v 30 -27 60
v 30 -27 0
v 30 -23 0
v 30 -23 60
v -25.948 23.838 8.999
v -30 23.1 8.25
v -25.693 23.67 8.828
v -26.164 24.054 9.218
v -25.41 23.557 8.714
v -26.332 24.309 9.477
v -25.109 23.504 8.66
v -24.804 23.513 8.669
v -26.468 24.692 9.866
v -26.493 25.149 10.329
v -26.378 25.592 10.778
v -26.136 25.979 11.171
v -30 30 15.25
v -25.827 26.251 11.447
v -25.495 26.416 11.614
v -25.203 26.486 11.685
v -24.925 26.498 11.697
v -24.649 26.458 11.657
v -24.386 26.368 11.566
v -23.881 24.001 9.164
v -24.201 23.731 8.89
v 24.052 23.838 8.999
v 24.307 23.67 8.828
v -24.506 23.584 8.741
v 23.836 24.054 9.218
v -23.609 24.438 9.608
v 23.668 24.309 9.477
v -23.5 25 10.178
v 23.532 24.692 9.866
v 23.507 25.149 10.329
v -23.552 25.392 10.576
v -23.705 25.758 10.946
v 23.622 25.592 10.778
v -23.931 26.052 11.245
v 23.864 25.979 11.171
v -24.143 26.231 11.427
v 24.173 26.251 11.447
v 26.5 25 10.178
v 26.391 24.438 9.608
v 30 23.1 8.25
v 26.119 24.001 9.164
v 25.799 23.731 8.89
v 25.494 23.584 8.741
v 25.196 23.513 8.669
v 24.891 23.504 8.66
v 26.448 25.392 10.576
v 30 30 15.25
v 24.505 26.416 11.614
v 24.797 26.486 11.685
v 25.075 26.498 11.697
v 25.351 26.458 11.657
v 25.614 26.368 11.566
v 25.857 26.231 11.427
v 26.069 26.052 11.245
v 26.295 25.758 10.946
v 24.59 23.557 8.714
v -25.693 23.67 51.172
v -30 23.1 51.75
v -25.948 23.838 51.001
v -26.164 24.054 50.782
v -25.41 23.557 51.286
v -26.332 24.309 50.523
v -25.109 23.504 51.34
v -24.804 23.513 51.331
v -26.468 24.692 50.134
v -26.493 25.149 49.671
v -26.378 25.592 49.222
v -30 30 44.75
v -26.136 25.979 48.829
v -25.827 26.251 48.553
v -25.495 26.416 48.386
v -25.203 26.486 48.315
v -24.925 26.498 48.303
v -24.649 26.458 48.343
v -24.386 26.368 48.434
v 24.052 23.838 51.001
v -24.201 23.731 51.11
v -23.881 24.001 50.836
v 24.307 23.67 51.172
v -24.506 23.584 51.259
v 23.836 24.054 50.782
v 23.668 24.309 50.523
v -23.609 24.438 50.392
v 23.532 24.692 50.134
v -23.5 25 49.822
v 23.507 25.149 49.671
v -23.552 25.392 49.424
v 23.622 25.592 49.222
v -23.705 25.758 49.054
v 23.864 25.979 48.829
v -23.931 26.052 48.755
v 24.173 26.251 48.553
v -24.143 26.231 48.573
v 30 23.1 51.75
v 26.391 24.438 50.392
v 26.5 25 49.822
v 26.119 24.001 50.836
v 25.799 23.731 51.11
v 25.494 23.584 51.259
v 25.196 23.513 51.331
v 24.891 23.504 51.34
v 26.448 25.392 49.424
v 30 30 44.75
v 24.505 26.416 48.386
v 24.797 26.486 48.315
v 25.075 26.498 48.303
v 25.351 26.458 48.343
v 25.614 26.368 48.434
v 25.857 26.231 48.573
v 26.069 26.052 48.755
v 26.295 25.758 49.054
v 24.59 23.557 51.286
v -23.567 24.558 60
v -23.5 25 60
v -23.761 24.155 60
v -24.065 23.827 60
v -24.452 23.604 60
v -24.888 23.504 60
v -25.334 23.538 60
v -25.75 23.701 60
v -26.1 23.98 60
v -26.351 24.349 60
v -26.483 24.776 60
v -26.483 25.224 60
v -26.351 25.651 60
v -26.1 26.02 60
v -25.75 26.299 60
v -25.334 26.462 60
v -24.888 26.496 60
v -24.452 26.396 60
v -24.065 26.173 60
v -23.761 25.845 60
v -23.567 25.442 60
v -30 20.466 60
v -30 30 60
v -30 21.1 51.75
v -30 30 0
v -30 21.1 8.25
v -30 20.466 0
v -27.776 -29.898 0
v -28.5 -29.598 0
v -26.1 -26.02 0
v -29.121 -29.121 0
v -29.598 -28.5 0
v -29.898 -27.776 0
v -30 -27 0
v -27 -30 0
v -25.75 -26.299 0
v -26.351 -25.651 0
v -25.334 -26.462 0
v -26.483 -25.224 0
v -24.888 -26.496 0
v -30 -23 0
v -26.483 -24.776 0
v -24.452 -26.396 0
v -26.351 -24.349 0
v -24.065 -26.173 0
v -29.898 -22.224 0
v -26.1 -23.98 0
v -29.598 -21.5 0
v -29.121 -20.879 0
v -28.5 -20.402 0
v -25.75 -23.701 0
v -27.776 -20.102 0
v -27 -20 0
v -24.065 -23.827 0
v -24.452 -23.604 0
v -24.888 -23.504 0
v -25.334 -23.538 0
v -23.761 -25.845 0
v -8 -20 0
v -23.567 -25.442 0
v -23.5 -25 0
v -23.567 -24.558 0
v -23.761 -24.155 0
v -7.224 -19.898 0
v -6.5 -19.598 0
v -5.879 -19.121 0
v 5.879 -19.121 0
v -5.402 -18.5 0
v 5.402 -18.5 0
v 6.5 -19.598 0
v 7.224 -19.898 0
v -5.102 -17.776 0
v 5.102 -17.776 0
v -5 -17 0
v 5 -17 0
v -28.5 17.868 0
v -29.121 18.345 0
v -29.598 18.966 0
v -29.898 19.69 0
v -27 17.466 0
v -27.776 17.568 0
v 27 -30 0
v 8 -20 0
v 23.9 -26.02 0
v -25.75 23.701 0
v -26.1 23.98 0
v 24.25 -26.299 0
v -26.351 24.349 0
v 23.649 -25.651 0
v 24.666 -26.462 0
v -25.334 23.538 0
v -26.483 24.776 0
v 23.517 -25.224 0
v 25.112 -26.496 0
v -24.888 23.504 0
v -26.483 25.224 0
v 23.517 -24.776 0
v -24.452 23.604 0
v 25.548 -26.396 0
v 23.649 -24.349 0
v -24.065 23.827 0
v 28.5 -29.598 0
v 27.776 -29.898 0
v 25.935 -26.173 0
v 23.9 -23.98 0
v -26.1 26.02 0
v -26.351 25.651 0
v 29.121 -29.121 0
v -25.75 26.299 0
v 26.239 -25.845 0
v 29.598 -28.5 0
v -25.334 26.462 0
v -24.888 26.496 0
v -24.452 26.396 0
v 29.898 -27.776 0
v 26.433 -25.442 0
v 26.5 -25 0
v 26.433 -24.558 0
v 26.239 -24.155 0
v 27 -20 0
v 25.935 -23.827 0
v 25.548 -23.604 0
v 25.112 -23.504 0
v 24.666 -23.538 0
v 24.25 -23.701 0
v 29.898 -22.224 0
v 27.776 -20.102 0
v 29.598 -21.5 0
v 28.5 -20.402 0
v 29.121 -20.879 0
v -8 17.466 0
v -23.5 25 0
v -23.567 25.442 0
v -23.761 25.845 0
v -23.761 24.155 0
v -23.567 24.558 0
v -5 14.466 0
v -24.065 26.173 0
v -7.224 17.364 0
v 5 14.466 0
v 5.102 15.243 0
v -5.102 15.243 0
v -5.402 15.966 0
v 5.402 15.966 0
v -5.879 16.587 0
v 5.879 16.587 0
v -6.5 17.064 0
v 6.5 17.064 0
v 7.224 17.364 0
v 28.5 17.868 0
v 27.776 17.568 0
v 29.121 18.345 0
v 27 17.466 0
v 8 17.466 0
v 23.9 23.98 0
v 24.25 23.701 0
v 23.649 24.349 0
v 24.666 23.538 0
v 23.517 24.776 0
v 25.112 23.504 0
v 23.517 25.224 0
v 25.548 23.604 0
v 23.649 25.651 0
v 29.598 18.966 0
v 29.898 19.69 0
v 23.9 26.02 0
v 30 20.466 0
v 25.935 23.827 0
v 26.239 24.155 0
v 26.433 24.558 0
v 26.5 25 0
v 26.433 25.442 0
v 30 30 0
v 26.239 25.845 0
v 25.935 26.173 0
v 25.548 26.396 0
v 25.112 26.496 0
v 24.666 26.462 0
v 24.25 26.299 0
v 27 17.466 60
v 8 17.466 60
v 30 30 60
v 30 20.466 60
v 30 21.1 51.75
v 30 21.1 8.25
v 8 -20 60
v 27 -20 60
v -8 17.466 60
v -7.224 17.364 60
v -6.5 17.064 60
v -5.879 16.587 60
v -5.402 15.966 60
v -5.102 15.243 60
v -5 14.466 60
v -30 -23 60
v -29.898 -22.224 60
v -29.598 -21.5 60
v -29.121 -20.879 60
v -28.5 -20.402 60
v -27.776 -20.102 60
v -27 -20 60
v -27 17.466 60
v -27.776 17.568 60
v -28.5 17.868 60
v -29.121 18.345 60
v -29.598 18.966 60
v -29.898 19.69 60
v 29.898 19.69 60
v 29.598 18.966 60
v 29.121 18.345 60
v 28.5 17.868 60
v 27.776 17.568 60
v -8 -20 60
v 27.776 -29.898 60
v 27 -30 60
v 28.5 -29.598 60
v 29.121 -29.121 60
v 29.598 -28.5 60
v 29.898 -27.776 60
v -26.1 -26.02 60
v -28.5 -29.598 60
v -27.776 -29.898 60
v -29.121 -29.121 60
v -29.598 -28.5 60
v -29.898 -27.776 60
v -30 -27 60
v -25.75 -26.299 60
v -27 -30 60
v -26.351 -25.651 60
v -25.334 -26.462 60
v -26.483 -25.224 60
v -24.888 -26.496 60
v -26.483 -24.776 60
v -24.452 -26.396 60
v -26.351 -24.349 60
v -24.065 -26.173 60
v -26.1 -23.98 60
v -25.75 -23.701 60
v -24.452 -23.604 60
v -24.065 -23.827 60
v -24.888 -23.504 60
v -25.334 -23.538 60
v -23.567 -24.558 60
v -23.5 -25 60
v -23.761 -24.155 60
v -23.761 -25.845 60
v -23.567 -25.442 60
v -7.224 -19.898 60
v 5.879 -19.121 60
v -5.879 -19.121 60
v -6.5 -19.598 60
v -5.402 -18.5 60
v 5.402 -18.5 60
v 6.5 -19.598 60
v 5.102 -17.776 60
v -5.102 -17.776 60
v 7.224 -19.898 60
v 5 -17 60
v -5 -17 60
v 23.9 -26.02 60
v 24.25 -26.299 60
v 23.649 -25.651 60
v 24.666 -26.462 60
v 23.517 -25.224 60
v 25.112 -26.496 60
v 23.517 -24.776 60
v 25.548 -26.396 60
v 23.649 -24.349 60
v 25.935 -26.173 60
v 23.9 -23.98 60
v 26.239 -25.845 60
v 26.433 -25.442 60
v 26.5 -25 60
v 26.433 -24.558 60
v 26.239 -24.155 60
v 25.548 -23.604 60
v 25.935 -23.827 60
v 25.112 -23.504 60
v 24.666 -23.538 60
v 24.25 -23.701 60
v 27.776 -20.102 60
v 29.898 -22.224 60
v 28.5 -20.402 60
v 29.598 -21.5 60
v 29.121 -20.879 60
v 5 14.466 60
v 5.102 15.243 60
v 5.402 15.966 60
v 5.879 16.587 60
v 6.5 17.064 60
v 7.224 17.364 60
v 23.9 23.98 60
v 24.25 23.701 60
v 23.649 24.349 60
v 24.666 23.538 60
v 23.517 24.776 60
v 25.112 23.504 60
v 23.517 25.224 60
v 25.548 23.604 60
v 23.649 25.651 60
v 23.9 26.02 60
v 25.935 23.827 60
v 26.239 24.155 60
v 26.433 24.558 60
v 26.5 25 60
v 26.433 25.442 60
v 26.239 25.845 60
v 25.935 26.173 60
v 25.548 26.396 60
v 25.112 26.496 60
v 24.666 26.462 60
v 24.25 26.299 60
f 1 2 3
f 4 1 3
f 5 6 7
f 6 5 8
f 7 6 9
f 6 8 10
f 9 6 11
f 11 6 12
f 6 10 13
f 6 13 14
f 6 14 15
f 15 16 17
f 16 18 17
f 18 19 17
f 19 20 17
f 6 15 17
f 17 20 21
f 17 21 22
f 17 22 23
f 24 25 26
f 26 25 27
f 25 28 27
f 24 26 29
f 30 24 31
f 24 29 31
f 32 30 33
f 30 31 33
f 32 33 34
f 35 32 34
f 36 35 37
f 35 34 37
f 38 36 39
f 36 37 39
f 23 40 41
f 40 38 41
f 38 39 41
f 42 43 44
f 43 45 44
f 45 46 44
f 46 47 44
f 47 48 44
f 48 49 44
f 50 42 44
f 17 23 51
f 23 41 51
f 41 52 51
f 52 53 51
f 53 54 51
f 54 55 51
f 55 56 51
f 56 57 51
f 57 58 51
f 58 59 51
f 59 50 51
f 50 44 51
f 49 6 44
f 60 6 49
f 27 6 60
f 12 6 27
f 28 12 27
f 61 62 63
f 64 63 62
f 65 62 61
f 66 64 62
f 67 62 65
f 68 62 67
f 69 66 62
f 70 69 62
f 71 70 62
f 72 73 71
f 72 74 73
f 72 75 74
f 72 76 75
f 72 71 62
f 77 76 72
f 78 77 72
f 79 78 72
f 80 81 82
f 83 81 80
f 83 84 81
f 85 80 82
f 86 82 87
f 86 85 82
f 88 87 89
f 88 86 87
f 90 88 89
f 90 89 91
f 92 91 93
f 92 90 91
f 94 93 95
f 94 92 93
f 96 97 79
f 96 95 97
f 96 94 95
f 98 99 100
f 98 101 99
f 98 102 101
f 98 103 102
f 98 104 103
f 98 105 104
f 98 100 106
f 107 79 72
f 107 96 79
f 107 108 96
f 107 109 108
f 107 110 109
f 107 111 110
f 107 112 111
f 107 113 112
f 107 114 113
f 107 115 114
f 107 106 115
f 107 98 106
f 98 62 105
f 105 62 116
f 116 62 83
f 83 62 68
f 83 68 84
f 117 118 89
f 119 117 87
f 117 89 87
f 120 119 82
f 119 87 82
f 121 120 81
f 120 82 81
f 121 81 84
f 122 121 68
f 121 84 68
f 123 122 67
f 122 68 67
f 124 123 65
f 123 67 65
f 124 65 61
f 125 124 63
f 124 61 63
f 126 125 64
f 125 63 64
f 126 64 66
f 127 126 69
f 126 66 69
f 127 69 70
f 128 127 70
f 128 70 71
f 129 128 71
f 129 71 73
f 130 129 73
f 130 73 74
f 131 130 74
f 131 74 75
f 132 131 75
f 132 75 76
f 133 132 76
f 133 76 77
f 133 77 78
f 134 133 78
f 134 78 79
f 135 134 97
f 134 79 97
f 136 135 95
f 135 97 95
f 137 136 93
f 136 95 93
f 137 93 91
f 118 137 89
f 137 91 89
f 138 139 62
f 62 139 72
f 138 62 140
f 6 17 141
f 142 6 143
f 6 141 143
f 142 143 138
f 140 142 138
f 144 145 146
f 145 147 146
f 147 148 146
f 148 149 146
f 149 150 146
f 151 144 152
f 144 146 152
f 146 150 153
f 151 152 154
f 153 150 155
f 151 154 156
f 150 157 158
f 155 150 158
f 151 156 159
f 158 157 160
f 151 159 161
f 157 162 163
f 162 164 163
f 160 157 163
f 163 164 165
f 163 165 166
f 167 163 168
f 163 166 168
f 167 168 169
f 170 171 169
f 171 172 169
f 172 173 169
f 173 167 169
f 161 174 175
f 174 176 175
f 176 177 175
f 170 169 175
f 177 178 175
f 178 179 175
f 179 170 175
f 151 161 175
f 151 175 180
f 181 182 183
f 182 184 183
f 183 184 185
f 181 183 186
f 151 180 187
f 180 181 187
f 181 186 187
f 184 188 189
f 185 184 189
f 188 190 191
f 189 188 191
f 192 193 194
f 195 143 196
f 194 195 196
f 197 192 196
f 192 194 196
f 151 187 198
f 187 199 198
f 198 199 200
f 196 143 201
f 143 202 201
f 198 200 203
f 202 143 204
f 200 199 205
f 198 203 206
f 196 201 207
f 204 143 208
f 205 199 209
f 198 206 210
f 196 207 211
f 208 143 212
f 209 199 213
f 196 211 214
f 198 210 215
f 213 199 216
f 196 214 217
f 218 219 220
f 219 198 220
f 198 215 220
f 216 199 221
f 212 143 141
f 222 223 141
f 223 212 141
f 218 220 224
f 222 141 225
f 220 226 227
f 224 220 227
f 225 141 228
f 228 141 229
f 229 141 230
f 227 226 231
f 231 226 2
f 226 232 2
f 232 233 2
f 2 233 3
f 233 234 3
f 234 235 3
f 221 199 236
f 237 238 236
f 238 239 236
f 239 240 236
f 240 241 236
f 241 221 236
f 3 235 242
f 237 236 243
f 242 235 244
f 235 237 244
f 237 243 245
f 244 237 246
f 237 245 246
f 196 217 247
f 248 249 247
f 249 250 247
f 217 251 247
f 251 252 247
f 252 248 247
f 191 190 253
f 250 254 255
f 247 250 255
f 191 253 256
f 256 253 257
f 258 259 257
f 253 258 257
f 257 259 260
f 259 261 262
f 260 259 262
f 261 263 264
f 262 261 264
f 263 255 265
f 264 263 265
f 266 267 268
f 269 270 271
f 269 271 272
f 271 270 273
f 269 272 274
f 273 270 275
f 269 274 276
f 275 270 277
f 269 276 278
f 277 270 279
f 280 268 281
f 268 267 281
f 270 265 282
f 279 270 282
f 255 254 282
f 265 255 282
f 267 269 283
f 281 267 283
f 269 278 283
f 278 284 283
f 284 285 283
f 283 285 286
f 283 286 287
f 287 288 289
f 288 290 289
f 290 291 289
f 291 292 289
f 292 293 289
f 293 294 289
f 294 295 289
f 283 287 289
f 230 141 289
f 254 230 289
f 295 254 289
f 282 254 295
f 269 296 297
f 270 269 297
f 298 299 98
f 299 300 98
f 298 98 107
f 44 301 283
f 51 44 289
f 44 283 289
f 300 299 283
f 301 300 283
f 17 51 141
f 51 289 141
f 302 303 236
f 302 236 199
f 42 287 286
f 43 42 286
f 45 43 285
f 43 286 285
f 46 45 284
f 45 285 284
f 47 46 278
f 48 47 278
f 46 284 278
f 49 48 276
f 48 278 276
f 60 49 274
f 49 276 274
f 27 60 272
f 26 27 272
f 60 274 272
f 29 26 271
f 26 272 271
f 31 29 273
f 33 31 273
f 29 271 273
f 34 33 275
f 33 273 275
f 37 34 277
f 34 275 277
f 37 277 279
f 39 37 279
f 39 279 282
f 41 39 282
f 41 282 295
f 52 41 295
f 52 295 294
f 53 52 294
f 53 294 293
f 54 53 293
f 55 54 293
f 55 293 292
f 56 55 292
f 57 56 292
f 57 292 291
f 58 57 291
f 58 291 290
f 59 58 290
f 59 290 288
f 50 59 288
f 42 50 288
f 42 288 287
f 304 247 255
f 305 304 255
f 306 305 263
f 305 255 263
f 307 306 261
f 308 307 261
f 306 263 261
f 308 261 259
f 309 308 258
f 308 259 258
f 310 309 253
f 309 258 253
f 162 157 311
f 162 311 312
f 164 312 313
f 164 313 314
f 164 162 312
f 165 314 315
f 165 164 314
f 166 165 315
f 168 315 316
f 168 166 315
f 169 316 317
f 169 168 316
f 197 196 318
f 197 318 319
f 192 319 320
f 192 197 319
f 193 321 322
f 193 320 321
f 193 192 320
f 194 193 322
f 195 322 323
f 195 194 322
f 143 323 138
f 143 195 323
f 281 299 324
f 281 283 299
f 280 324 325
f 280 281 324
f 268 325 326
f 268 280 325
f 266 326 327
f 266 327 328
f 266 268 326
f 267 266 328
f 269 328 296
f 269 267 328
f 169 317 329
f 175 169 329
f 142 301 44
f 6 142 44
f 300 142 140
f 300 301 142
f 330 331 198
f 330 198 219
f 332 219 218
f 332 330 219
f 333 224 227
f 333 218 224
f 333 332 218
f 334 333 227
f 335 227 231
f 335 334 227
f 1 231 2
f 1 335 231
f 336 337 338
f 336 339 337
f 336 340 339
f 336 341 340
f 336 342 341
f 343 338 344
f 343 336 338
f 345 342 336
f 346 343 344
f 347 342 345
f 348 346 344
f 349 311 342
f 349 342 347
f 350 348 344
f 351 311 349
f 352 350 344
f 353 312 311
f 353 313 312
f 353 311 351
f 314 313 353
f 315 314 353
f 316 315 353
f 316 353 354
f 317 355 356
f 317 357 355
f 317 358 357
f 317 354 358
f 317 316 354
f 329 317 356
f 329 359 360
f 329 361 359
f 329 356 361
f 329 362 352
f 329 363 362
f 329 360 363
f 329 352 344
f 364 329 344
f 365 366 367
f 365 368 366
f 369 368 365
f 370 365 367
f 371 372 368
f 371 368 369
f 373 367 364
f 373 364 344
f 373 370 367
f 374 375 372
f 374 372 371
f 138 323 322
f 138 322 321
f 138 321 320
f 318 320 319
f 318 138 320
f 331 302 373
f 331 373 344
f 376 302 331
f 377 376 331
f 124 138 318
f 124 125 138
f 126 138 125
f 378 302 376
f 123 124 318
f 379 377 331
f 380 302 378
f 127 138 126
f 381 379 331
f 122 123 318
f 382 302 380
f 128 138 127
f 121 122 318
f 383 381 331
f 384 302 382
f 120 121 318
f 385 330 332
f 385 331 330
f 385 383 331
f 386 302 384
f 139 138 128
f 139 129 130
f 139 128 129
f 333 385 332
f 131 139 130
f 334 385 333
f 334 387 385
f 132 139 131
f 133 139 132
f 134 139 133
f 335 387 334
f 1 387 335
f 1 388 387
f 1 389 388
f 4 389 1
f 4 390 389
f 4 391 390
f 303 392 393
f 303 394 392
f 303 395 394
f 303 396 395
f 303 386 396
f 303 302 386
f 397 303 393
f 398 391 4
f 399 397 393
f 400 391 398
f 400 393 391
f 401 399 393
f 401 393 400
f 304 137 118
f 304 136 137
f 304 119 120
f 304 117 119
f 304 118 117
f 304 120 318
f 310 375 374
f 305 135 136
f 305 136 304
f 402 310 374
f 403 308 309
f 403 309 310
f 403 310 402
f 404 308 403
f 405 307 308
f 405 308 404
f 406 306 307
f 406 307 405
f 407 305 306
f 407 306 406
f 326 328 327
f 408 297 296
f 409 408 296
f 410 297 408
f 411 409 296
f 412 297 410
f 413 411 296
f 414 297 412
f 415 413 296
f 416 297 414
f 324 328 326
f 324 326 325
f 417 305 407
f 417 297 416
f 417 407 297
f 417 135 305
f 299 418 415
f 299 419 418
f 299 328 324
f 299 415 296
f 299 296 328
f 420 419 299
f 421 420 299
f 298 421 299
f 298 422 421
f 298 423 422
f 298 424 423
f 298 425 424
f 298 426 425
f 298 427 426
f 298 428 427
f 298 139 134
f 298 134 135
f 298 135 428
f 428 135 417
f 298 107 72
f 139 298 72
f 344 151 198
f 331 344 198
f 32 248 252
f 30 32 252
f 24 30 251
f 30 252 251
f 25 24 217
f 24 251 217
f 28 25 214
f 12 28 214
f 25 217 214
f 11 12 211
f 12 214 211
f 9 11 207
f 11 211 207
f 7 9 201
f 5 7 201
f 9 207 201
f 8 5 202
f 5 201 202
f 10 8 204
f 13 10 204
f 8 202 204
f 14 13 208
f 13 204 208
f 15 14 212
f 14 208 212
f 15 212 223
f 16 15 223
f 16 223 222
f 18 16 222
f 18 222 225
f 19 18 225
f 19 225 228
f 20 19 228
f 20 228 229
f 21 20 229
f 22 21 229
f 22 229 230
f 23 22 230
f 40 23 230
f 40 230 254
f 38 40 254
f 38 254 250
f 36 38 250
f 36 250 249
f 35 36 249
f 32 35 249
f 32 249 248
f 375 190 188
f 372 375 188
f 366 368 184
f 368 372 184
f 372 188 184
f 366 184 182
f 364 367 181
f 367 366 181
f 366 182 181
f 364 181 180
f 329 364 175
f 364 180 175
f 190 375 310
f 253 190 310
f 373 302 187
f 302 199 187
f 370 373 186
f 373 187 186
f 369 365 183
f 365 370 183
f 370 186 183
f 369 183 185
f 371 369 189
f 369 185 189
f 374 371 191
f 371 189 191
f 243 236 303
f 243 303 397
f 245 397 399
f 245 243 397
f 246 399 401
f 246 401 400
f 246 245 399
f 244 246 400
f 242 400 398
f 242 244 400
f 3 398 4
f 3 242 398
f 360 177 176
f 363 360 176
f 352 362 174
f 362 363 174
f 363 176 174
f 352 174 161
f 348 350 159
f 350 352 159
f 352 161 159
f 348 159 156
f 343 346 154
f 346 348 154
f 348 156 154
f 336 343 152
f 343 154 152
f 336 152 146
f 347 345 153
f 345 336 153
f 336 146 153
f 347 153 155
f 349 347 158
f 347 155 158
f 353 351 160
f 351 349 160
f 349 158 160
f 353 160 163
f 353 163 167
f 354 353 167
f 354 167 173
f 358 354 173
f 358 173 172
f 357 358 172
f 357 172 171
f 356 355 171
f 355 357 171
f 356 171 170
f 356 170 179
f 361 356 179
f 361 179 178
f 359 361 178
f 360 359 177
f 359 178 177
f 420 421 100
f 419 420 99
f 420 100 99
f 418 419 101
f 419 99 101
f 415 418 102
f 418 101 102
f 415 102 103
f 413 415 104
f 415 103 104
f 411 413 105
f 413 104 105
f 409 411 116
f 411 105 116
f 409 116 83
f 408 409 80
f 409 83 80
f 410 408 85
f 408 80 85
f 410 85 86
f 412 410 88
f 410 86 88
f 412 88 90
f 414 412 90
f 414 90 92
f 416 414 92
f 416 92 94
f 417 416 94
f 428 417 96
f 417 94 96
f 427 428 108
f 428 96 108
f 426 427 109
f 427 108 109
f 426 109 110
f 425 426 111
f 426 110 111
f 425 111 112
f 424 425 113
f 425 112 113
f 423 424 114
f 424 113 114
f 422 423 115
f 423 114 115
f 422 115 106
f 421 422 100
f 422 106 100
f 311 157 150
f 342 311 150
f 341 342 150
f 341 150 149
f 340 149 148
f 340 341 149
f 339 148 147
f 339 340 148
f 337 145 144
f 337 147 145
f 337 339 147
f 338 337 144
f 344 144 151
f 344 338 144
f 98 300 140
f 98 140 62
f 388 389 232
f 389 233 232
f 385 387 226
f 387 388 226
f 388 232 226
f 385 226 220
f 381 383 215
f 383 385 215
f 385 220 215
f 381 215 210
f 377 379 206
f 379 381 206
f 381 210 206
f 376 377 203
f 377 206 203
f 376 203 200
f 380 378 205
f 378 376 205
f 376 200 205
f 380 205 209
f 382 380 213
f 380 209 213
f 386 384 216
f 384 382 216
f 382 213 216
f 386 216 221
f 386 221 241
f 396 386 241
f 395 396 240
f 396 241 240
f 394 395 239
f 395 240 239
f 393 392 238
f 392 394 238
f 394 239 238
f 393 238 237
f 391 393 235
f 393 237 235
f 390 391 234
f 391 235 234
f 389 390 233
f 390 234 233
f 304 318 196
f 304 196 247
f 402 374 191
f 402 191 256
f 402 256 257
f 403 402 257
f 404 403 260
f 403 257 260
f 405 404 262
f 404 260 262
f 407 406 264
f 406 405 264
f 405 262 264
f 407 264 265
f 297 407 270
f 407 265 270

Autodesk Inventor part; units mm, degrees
ref_plane "YZ Plane" through (0, 0, 0) normal (1, 0, 0) x (0, 1, 0)
ref_plane "XZ Plane" through (0, 0, 0) normal (0, 1, 0) x (-1, 0, 0)
ref_plane "XY Plane" through (0, 0, 0) normal (0, 0, 1) x (1, 0, 0)
sketch "Sketch1" plane through (0, 0, 0) normal (0, 0, 1) x (1, 0, 0)
  line L0 (-30, -30) -> (30, -30)
  line L1 (30, -30) -> (30, 30)
  line L2 (30, 30) -> (-30, 30)
  line L3 (-30, 30) -> (-30, -30)
  line L4 (-30, -30) -> (30, 30) construction
  line L5 (30, -30) -> (-30, 30) construction
  line L6 (30, 30) -> (25, 30) construction
  line L7 (25, 30) -> (25, 25) construction
  line L8 (-30, 30) -> (-25, 30) construction
  line L9 (-25, 30) -> (-25, 25) construction
  line L10 (-30, -30) -> (-30, -25) construction
  line L11 (-30, -25) -> (-25, -25) construction
  line L12 (30, -30) -> (30, -25) construction
  line L13 (30, -25) -> (25, -25) construction
  circle A0 centre (-25, 25) radius 1.5
  circle A1 centre (25, 25) radius 1.5
  circle A2 centre (25, -25) radius 1.5
  circle A3 centre (-25, -25) radius 1.5
  point P0 (0, 0)
  dimension "d0" = 60
  dimension "d1" = 60
  dimension "d2" = 5
  dimension "d3" = 5
  dimension "d4" = 5
  dimension "d5" = 5
  dimension "d6" = 5
  dimension "d7" = 5
  dimension "d8" = 5
  dimension "d9" = 5
  dimension "d10" = 3
  dimension "d11" = 3
  dimension "d12" = 3
  dimension "d13" = 3
extrude "Block" add sketch "Sketch1" along normal blind 60
sketch "Sketch2" plane through (30, -30, 0) normal (1, 0, 0) x (0, 0, -1)
  line L0 (0, 60) -> (-60, 60) projected
  line L1 (-30, 60) -> (-15.25, 60)
  line L2 (-30, 60) -> (-44.75, 60)
  line L3 (-30, 60) -> (-30, 51.1) construction
  line L4 (-30, 51.1) -> (-8.25, 51.1)
  line L5 (-30, 51.1) -> (-51.75, 51.1)
  line L6 (-51.75, 51.1) -> (-51.75, 53.1)
  line L7 (-8.25, 51.1) -> (-8.25, 53.1)
  line L8 (-8.25, 53.1) -> (-15.25, 60)
  line L9 (-51.75, 53.1) -> (-44.75, 60)
  point P0 (0, 30)
  dimension "d17" = 14.75
  dimension "d18" = 14.75
  dimension "d19" = 8.9
  dimension "d20" = 21.75
  dimension "d21" = 21.75
  dimension "d22" = 2
  dimension "d23" = 2
extrude "Tripod Slot" cut sketch "Sketch2" against normal blind 60
sketch "Sketch3" plane through (0, 0, 60) normal (0, 0, 1) x (1, 0, 0)
  circle A0 centre (-25, -25) radius 1.5 construction
  line L0 (-25, -25) -> (-25, -20) construction
  line L1 (-25, -25) -> (-20, -25) construction
  line L2 (25.1388, -25) -> (25.1388, -20) construction
  line L3 (25.1388, -25) -> (30.1388, -25) construction
  line L4 (-25, 24.9661) -> (-25, 17.4661) construction
  line L5 (-25, 24.9661) -> (-17.5, 24.9661) construction
  line L6 (25.1388, 24.9661) -> (25.1388, 17.4661) construction
  line L7 (25.1388, 24.9661) -> (32.6388, 24.9661) construction
  line L8 (25.1388, 17.4661) -> (30, 17.4661) construction
  line L9 (30, -30) -> (30, 30) construction
  line L10 (-25, 17.4661) -> (-30, 17.4661) construction
  line L11 (-30, 30) -> (-30, -30) construction
  line L12 (-25, -20) -> (-30, -20) construction
  line L13 (25.1388, -20) -> (30, -20) construction
  line L14 (30, 17.4661) -> (5, 17.4661)
  line L15 (30, -20) -> (5, -20)
  line L16 (5, -20) -> (5, 17.4661)
  line L17 (-30, 17.4661) -> (-5, 17.4661)
  line L18 (-30, -20) -> (-5, -20)
  line L19 (-5, -20) -> (-5, 17.4661)
  line L20 (-30, 17.4661) -> (-30, -20)
  line L21 (30, 17.4661) -> (30, -20)
  point P0 (0, 0)
  dimension "d26" = 5
  dimension "d27" = 90
  dimension "d28" = 5
  dimension "d29" = 90
  dimension "d30" = 7.5
  dimension "d31" = 90
  dimension "d32" = 7.5
  dimension "d33" = 90
  dimension "d34" = 25
  dimension "d35" = 25
  dimension "d36" = 25
  dimension "d37" = 25
  dimension "d38" = 90
  dimension "d39" = 90
  dimension "d40" = 4.8612
  dimension "d41" = 4.8612
  dimension "d42" = 55
extrude "Plastic Thinning" cut sketch "Sketch3" against normal blind 60
fillet "Strength" radius 3 10 edges at (30, -20, 30) (5, 17.4661, 30) (-5, 17.4661, 30) (-5, -20, 30) (5, -20, 30) (30, -30, 30) (-30, -30, 30) (-30, -20, 30) (-30, 17.4661, 30) (30, 17.4661, 30)
properties part number "60x60CameraMount"
